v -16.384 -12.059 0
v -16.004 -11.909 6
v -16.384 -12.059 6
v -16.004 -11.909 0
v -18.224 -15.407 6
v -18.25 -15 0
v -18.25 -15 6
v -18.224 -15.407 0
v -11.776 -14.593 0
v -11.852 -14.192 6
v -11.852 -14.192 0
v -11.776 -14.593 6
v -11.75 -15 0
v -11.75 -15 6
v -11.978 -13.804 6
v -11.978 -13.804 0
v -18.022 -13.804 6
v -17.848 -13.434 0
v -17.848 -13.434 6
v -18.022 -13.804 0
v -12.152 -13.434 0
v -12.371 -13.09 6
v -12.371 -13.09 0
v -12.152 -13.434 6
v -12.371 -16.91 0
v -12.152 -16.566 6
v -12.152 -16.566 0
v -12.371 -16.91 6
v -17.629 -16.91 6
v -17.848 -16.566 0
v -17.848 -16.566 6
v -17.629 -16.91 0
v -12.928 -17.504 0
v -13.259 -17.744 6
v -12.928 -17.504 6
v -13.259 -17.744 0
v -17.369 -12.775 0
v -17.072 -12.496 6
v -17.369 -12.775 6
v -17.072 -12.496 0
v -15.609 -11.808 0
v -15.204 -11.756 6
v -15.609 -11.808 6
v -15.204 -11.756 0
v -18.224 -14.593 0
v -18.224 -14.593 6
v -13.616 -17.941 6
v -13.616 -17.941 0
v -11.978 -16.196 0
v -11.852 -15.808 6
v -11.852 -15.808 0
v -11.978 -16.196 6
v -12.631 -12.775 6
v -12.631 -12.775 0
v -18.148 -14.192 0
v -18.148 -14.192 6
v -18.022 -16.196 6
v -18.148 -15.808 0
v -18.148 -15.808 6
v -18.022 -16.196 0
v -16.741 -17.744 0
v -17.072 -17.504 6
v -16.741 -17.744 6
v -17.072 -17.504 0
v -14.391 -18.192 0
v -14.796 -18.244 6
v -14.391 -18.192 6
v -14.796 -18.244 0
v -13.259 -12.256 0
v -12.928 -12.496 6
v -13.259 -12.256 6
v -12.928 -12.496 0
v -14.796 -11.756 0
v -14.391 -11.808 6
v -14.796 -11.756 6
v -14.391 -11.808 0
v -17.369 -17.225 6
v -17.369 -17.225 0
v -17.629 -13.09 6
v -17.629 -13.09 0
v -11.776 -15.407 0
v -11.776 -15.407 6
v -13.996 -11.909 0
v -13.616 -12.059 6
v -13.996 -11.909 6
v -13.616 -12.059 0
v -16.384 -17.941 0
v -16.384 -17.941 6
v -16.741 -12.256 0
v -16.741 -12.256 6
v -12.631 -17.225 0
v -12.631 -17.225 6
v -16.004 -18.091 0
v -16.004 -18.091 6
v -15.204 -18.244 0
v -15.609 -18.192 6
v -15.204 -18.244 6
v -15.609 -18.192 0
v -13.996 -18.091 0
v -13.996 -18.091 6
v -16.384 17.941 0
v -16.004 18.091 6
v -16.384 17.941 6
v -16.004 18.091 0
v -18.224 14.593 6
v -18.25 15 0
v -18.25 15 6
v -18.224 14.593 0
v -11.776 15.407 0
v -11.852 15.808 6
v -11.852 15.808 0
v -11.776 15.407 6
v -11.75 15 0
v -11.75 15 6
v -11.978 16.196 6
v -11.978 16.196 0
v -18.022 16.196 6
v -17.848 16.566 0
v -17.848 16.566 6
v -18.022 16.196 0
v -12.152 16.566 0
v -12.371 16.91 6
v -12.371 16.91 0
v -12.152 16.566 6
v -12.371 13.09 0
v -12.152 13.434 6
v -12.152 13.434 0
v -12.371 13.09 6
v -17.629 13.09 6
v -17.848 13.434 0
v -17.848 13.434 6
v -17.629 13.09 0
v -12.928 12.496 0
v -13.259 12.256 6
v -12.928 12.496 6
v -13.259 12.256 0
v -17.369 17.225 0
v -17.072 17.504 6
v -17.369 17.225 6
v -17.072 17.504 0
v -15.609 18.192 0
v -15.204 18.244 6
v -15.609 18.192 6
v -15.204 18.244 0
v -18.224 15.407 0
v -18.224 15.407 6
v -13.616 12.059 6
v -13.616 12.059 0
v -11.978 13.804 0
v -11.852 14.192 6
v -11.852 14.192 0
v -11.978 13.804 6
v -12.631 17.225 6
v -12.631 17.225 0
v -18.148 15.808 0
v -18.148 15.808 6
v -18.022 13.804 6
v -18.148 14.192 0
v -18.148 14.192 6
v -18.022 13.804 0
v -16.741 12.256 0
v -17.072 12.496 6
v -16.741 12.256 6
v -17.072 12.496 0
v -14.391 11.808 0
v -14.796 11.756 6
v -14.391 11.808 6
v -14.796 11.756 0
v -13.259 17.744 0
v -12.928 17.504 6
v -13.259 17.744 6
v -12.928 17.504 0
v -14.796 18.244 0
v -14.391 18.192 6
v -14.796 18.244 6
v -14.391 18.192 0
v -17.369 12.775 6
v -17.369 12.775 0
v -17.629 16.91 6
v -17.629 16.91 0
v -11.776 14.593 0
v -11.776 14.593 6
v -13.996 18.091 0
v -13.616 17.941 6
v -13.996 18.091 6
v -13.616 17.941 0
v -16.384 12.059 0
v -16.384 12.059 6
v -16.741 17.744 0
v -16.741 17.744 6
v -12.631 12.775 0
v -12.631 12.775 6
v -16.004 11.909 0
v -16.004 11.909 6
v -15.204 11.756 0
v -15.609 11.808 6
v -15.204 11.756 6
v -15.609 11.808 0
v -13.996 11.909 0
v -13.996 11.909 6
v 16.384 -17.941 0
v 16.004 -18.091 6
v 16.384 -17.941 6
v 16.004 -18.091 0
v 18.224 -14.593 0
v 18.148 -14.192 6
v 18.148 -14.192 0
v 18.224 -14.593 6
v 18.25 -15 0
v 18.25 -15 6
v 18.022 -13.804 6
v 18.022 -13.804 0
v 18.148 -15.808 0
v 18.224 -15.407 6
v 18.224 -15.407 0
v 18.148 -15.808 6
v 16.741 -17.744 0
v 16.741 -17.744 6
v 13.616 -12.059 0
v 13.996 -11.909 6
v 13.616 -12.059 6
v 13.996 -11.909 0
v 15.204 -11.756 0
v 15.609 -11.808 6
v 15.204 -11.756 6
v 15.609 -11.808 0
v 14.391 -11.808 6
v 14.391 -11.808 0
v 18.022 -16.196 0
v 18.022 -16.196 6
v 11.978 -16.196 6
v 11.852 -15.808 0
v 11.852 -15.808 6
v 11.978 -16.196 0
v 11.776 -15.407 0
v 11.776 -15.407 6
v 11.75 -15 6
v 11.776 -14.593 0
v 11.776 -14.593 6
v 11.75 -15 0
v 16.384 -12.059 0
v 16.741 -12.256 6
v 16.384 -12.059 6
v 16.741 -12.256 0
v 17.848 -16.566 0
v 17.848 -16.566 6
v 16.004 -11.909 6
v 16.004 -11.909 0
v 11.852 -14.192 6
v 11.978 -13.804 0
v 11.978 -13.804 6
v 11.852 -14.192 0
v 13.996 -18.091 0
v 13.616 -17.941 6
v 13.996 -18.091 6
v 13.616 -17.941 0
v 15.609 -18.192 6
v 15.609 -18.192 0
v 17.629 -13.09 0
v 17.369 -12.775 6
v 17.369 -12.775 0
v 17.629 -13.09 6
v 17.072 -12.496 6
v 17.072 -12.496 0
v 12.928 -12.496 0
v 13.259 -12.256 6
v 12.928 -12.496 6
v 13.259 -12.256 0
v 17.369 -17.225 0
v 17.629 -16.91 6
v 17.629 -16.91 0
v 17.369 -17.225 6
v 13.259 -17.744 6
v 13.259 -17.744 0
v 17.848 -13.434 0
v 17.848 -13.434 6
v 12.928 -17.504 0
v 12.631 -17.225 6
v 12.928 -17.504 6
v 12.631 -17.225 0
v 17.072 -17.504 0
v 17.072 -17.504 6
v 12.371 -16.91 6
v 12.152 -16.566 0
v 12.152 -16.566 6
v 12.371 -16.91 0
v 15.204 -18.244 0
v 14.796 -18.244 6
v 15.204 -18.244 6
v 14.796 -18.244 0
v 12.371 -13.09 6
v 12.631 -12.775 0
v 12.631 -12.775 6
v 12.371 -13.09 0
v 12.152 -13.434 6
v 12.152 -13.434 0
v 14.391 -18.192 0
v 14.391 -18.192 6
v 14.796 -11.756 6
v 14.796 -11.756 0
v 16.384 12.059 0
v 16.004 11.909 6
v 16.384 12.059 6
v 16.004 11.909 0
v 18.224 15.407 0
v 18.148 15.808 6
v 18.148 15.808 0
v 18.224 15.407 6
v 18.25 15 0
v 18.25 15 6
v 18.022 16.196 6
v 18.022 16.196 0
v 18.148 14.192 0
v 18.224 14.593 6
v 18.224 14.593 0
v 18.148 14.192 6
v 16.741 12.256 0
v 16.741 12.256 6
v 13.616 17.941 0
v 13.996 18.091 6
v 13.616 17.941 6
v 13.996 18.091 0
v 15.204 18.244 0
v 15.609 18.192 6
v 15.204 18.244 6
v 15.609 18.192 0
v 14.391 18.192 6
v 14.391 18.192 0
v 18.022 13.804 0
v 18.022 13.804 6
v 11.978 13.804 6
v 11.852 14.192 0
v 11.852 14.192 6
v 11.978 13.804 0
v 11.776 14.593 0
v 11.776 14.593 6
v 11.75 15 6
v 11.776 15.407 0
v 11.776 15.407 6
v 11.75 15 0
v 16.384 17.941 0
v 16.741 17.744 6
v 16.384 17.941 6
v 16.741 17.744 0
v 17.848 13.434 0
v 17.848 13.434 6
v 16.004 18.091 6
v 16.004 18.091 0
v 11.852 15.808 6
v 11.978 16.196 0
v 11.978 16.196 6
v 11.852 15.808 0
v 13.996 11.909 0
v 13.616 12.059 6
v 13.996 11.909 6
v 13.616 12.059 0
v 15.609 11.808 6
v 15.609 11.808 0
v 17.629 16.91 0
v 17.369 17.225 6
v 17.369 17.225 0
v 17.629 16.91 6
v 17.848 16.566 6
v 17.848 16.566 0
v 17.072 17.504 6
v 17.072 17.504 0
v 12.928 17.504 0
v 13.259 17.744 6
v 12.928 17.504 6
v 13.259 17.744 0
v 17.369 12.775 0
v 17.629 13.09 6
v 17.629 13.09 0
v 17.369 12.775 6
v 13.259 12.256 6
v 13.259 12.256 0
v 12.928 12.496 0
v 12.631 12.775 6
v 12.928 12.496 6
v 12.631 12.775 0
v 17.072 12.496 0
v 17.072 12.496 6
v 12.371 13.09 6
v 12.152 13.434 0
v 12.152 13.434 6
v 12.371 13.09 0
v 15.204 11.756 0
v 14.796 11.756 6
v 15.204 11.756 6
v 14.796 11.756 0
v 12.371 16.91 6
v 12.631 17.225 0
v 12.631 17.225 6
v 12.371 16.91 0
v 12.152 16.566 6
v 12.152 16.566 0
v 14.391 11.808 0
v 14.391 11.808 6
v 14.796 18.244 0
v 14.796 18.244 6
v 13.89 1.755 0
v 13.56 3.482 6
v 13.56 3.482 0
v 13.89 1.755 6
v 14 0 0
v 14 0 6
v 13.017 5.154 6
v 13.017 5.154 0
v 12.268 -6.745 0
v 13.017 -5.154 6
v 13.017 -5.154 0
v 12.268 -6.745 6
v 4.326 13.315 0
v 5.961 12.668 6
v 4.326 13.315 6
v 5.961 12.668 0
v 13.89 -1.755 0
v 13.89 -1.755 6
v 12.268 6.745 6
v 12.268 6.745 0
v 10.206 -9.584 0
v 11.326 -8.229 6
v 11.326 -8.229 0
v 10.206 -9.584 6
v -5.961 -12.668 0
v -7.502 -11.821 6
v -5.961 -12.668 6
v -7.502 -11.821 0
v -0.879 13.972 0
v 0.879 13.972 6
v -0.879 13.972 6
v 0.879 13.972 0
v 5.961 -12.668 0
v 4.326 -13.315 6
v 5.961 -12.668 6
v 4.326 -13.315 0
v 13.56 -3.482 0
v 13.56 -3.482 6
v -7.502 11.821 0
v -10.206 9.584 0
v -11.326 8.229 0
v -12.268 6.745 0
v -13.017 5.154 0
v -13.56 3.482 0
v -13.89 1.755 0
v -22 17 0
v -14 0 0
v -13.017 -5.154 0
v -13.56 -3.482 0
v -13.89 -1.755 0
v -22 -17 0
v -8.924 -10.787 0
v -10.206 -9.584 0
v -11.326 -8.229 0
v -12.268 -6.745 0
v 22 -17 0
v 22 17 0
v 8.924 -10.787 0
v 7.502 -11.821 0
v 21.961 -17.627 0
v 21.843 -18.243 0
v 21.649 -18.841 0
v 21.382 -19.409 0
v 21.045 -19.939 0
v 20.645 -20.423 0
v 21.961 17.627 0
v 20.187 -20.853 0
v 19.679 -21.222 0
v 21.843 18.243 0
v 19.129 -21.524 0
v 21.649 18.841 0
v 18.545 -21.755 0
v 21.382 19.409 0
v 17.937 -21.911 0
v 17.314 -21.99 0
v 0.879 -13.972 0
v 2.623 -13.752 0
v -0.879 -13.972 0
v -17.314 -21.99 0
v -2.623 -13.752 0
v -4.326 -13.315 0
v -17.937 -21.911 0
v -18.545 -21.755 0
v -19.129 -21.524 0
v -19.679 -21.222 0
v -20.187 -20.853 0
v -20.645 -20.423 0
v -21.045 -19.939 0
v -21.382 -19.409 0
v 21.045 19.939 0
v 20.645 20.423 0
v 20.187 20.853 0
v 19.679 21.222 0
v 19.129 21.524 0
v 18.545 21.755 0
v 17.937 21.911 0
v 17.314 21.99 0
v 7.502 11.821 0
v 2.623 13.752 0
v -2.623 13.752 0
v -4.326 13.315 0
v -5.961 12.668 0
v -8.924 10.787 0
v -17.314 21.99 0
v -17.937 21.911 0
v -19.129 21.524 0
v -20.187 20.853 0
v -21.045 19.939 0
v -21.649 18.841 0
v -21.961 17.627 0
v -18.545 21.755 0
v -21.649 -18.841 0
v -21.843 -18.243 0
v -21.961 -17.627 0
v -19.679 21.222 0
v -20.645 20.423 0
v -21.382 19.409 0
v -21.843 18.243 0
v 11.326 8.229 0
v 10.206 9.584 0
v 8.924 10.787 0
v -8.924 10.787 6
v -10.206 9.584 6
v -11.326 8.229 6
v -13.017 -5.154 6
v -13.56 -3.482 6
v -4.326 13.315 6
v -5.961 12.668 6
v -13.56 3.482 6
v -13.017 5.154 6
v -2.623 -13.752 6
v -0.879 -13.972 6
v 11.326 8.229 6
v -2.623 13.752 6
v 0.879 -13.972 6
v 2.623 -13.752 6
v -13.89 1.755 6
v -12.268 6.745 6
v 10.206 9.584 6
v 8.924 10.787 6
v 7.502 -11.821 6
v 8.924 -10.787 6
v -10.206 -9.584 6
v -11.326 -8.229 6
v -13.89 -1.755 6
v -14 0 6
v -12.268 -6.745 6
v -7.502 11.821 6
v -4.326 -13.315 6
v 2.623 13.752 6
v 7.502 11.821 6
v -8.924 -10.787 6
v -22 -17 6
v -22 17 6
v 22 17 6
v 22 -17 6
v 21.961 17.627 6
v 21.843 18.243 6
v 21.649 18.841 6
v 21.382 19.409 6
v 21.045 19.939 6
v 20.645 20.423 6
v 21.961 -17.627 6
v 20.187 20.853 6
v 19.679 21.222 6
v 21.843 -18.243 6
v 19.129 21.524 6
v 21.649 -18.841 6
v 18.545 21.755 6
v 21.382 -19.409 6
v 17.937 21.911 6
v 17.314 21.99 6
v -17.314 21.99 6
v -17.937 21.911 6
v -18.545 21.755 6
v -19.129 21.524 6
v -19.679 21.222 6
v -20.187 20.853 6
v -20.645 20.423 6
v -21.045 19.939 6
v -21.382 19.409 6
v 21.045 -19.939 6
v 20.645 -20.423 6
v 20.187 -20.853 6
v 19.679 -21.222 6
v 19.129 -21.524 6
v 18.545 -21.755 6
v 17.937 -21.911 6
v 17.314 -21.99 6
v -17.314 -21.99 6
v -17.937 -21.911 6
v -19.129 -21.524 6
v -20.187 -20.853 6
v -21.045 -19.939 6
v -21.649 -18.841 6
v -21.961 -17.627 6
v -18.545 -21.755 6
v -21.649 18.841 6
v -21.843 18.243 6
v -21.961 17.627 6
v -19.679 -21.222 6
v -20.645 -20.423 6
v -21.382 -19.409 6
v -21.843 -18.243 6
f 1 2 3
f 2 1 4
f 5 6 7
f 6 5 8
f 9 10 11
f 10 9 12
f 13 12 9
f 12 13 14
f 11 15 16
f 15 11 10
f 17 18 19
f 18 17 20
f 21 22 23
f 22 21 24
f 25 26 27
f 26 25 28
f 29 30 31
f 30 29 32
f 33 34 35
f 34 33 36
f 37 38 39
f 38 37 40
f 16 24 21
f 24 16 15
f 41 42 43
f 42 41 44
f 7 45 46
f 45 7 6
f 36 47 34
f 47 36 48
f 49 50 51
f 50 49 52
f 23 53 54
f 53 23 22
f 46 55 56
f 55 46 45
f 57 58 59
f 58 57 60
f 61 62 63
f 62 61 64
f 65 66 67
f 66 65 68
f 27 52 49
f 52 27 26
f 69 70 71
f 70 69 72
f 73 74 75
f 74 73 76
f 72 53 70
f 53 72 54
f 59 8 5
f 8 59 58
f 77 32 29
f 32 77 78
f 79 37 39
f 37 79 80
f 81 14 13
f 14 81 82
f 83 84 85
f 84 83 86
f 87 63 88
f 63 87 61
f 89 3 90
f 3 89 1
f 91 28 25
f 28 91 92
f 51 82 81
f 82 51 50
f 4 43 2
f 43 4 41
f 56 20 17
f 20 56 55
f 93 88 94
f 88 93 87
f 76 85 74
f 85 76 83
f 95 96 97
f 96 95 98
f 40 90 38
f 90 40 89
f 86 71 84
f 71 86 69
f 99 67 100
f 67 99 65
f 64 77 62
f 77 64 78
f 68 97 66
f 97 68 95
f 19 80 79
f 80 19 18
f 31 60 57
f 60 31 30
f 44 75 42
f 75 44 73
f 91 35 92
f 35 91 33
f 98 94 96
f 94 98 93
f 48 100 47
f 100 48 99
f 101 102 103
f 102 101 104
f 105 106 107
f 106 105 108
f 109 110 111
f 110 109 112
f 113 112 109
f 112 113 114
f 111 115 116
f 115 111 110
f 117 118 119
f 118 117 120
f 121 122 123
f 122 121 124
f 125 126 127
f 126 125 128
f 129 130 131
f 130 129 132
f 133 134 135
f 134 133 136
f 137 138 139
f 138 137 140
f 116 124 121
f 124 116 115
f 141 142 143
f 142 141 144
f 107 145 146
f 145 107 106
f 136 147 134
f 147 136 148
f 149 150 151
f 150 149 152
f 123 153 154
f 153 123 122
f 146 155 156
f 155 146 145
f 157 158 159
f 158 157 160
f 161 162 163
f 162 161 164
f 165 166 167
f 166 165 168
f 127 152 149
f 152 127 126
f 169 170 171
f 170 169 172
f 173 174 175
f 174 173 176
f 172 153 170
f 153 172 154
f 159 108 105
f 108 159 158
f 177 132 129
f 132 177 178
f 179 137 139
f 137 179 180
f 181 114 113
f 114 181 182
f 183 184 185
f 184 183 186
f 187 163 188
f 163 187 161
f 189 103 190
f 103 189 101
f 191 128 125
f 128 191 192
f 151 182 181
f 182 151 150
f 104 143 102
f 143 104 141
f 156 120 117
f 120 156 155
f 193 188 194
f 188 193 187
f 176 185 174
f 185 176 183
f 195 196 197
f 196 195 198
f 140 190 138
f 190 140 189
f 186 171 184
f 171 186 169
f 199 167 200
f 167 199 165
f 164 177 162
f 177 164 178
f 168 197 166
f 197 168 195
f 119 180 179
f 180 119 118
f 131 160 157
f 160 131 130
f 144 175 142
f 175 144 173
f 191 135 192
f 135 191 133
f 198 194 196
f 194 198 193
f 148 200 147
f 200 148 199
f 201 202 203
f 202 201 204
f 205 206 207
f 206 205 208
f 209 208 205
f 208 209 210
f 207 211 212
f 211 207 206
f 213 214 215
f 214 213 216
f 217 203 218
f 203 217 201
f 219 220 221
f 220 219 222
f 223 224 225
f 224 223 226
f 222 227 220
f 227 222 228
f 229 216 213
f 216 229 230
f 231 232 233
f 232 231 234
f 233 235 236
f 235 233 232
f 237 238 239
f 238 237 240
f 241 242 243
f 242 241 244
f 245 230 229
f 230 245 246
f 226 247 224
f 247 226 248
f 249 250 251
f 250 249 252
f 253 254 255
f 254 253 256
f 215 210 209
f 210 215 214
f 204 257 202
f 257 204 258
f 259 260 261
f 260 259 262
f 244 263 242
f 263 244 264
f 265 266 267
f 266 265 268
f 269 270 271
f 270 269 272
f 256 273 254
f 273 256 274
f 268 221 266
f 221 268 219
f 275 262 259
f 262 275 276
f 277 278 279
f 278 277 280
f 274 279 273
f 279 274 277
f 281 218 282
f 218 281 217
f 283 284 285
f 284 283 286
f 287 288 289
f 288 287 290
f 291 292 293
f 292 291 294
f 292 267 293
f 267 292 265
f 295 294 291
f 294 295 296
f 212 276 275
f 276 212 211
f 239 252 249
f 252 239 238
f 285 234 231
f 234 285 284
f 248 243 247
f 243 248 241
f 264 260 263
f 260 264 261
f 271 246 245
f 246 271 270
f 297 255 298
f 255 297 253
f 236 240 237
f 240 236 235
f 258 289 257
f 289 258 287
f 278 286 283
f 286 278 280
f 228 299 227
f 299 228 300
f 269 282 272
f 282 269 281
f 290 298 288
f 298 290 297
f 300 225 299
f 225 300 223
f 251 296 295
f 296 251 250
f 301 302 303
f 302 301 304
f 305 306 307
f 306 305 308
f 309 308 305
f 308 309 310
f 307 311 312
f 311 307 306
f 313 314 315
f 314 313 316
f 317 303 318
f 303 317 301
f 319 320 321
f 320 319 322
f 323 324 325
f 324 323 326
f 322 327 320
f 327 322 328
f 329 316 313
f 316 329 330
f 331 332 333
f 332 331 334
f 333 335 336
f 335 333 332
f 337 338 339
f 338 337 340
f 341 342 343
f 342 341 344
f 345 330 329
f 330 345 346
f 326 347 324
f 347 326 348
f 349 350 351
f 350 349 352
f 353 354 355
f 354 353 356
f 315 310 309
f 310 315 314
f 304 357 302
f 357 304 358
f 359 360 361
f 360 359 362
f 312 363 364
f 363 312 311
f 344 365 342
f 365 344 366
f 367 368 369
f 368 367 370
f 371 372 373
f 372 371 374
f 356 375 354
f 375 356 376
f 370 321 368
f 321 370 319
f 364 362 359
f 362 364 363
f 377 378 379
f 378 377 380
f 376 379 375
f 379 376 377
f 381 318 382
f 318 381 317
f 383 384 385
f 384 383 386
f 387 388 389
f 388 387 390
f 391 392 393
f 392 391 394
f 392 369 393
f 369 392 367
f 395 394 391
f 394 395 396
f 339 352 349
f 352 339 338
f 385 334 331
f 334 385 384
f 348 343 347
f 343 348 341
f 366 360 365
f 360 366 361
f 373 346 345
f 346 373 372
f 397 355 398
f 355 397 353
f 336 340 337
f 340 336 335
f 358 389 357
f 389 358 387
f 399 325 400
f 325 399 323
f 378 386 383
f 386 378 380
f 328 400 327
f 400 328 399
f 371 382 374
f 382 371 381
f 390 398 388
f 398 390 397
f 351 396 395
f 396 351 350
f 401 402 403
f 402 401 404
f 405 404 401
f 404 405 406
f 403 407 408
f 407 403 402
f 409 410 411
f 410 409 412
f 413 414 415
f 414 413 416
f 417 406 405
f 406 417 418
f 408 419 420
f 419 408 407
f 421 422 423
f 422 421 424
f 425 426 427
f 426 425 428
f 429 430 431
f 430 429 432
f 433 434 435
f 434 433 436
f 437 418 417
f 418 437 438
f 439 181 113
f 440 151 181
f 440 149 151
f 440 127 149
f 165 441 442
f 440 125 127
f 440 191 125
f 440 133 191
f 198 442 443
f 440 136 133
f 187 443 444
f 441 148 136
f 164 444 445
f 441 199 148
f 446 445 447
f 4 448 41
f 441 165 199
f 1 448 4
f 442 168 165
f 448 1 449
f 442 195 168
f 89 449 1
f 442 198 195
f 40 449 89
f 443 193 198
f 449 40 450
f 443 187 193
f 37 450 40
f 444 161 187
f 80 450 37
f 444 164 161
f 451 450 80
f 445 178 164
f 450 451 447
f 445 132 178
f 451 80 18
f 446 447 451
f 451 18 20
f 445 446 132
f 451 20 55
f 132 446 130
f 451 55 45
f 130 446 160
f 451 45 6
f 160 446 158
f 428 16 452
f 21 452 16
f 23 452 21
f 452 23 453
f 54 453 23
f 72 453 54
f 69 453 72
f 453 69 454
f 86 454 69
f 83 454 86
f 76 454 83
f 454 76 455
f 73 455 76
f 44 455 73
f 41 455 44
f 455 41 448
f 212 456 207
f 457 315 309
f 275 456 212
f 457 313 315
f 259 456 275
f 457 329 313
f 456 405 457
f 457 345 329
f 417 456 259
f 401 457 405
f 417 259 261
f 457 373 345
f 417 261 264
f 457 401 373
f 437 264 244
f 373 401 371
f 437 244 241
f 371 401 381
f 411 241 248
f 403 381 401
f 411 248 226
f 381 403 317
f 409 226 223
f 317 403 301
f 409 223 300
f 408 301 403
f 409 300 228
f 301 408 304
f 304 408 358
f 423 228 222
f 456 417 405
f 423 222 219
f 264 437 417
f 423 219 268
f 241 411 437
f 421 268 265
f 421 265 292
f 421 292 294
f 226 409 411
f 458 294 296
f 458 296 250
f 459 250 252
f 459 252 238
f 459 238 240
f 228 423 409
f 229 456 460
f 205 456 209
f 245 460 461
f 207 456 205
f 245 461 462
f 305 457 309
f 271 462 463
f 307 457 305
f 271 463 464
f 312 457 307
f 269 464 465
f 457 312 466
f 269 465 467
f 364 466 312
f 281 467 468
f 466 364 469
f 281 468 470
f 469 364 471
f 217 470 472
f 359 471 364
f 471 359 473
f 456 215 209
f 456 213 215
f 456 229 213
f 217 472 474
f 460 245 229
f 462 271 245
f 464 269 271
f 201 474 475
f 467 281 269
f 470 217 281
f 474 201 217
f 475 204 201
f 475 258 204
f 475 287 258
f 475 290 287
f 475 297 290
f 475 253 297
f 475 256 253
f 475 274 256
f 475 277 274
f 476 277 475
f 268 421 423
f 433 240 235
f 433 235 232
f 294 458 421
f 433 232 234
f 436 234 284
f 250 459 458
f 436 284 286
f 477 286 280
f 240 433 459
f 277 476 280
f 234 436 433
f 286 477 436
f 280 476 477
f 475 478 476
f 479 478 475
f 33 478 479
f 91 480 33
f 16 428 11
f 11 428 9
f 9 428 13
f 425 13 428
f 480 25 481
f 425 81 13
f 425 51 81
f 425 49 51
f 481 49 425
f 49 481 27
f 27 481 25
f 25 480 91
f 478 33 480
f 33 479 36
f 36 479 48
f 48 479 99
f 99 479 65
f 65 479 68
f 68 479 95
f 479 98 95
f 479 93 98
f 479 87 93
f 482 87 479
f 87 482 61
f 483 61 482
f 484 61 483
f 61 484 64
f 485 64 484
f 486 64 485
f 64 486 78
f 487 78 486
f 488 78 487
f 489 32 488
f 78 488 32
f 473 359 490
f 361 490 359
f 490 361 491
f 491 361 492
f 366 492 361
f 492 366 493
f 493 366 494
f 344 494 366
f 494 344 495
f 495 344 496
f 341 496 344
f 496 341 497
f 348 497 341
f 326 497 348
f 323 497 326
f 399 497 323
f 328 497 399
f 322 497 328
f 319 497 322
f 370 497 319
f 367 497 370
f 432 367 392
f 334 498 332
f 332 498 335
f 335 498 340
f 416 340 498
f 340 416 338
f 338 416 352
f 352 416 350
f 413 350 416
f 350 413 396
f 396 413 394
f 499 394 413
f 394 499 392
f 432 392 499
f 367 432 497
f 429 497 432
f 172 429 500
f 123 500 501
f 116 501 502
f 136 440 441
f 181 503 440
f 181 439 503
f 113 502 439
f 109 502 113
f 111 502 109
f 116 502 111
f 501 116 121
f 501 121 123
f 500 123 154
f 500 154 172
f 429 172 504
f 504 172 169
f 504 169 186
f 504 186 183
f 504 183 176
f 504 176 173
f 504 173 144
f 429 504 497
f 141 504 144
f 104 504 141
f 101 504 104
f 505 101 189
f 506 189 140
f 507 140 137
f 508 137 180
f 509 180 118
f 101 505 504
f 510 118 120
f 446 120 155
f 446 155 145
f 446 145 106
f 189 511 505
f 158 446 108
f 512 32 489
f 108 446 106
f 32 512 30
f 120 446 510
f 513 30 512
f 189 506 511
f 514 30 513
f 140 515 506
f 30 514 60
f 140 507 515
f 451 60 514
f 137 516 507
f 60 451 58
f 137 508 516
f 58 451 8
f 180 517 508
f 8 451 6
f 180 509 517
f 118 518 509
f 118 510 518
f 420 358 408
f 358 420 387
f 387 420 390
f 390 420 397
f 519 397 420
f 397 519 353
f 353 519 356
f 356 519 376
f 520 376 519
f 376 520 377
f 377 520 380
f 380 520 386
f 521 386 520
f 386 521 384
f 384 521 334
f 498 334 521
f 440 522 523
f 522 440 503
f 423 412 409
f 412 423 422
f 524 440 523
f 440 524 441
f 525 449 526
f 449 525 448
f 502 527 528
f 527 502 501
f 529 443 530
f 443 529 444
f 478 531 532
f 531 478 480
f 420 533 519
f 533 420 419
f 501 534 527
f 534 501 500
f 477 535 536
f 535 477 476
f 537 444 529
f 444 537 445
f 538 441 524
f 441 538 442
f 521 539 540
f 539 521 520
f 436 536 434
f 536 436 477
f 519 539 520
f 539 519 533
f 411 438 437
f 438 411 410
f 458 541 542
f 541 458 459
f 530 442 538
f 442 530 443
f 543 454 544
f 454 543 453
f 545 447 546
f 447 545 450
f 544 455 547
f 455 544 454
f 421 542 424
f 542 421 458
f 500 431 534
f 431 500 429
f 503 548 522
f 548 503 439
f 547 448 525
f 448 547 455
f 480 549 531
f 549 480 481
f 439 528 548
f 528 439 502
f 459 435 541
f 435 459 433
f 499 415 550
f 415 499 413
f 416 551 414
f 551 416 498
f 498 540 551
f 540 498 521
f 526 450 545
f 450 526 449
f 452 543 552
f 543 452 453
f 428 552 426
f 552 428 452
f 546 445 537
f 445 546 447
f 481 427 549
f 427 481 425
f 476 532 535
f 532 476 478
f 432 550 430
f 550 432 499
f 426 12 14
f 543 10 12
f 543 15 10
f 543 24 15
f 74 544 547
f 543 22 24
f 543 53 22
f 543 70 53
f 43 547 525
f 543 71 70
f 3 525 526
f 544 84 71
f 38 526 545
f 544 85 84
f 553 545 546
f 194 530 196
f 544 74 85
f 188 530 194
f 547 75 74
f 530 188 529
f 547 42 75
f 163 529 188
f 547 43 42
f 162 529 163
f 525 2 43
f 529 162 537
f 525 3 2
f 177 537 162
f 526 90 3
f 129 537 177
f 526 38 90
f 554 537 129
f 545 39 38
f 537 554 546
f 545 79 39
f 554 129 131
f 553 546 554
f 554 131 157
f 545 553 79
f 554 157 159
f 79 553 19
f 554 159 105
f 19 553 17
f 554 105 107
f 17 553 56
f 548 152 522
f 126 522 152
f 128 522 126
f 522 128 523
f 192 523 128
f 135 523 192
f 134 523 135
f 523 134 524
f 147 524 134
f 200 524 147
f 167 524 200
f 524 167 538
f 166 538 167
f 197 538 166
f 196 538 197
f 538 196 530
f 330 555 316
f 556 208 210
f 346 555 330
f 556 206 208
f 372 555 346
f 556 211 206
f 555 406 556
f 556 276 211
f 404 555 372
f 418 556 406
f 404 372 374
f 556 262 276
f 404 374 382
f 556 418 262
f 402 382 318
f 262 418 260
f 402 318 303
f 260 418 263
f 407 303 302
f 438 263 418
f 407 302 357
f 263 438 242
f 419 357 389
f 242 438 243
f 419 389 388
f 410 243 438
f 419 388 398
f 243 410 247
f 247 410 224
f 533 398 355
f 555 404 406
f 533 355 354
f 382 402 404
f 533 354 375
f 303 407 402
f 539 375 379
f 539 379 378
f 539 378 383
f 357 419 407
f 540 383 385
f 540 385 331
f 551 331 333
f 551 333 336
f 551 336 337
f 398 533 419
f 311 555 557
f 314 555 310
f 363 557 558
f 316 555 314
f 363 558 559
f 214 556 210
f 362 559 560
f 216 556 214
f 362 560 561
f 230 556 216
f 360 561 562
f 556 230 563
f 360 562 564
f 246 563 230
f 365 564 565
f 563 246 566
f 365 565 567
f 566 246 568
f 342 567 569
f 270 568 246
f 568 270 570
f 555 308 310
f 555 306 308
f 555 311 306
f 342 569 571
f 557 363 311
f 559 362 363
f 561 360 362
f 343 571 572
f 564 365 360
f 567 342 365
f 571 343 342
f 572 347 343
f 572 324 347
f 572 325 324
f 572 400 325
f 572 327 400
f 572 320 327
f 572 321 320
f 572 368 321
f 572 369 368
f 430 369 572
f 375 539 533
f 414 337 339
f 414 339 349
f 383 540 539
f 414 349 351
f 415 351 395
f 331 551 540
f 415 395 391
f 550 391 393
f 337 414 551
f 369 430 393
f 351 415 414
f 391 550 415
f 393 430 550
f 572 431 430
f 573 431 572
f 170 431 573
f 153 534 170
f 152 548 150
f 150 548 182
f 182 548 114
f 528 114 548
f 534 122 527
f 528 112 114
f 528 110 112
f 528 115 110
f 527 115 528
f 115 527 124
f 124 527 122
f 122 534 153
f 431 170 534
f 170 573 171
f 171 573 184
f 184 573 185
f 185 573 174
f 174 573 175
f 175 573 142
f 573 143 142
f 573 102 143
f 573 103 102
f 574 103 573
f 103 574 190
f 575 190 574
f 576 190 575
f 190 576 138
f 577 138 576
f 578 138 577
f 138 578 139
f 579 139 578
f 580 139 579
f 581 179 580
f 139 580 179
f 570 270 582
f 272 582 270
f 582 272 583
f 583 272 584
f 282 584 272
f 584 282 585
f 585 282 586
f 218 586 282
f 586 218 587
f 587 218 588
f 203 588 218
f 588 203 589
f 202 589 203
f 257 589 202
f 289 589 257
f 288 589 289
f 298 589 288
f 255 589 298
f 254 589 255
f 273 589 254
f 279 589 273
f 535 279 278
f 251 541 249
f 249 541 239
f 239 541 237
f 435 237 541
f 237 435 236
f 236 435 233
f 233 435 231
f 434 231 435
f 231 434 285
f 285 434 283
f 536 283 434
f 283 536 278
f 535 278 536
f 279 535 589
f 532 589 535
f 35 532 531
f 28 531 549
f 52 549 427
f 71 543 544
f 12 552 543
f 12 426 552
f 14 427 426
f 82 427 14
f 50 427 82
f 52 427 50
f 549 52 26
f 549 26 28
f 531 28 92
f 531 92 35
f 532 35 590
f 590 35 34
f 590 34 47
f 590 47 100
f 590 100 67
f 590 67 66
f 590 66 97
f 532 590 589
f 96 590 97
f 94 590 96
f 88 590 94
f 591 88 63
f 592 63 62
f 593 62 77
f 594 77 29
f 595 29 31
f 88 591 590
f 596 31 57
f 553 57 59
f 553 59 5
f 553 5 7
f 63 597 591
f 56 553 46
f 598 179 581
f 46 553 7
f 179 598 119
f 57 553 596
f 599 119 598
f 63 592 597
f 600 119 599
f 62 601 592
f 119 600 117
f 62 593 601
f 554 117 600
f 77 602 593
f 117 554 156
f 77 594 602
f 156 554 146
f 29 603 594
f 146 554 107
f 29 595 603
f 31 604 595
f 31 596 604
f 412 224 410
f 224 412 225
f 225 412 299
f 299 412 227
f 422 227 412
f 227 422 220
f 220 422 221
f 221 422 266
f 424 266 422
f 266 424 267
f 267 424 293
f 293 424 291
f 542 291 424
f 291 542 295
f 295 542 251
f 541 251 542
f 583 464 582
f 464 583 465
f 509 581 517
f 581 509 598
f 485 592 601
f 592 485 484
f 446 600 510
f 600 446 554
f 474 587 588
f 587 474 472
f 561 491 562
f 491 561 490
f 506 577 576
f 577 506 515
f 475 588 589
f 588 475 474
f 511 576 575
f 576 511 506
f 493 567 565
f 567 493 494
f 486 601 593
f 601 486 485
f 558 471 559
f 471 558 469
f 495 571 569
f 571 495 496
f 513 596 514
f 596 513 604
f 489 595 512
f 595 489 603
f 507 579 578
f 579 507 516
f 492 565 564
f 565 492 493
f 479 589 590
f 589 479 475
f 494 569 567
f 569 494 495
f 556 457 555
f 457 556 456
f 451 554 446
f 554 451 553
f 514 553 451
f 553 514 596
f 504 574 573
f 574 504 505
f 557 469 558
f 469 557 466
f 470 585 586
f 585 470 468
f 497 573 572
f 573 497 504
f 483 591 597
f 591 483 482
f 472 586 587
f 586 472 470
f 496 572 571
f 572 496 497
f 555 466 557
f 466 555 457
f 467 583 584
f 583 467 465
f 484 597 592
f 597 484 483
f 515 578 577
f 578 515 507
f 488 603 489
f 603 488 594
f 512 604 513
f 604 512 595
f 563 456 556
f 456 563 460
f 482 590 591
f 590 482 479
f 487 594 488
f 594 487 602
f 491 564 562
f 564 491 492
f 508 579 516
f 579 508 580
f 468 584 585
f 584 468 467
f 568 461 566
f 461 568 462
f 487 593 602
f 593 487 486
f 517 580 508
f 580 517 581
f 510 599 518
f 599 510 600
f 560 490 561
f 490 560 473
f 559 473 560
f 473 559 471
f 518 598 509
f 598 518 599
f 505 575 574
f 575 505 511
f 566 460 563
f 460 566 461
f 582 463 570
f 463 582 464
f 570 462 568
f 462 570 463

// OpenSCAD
$fn = 50;

difference() {
	union() {
		hull() {
			translate(v = [-17.0, 17.0, 0]) {
				cylinder(h = 6, r = 5);
			}
			translate(v = [17.0, 17.0, 0]) {
				cylinder(h = 6, r = 5);
			}
			translate(v = [-17.0, -17.0, 0]) {
				cylinder(h = 6, r = 5);
			}
			translate(v = [17.0, -17.0, 0]) {
				cylinder(h = 6, r = 5);
			}
		}
	}
	union() {
		translate(v = [-15.0, -15.0, -100.0]) {
			cylinder(h = 200, r = 3.25);
		}
		translate(v = [-15.0, 15.0, -100.0]) {
			cylinder(h = 200, r = 3.25);
		}
		translate(v = [15.0, -15.0, -100.0]) {
			cylinder(h = 200, r = 3.25);
		}
		translate(v = [15.0, 15.0, -100.0]) {
			cylinder(h = 200, r = 3.25);
		}
		translate(v = [-15.0, -15.0, -100.0]) {
			cylinder(h = 200, r = 1.8);
		}
		translate(v = [-15.0, 15.0, -100.0]) {
			cylinder(h = 200, r = 1.8);
		}
		translate(v = [15.0, -15.0, -100.0]) {
			cylinder(h = 200, r = 1.8);
		}
		translate(v = [15.0, 15.0, -100.0]) {
			cylinder(h = 200, r = 1.8);
		}
		cylinder(h = 6, r = 14.0);
	}
}
